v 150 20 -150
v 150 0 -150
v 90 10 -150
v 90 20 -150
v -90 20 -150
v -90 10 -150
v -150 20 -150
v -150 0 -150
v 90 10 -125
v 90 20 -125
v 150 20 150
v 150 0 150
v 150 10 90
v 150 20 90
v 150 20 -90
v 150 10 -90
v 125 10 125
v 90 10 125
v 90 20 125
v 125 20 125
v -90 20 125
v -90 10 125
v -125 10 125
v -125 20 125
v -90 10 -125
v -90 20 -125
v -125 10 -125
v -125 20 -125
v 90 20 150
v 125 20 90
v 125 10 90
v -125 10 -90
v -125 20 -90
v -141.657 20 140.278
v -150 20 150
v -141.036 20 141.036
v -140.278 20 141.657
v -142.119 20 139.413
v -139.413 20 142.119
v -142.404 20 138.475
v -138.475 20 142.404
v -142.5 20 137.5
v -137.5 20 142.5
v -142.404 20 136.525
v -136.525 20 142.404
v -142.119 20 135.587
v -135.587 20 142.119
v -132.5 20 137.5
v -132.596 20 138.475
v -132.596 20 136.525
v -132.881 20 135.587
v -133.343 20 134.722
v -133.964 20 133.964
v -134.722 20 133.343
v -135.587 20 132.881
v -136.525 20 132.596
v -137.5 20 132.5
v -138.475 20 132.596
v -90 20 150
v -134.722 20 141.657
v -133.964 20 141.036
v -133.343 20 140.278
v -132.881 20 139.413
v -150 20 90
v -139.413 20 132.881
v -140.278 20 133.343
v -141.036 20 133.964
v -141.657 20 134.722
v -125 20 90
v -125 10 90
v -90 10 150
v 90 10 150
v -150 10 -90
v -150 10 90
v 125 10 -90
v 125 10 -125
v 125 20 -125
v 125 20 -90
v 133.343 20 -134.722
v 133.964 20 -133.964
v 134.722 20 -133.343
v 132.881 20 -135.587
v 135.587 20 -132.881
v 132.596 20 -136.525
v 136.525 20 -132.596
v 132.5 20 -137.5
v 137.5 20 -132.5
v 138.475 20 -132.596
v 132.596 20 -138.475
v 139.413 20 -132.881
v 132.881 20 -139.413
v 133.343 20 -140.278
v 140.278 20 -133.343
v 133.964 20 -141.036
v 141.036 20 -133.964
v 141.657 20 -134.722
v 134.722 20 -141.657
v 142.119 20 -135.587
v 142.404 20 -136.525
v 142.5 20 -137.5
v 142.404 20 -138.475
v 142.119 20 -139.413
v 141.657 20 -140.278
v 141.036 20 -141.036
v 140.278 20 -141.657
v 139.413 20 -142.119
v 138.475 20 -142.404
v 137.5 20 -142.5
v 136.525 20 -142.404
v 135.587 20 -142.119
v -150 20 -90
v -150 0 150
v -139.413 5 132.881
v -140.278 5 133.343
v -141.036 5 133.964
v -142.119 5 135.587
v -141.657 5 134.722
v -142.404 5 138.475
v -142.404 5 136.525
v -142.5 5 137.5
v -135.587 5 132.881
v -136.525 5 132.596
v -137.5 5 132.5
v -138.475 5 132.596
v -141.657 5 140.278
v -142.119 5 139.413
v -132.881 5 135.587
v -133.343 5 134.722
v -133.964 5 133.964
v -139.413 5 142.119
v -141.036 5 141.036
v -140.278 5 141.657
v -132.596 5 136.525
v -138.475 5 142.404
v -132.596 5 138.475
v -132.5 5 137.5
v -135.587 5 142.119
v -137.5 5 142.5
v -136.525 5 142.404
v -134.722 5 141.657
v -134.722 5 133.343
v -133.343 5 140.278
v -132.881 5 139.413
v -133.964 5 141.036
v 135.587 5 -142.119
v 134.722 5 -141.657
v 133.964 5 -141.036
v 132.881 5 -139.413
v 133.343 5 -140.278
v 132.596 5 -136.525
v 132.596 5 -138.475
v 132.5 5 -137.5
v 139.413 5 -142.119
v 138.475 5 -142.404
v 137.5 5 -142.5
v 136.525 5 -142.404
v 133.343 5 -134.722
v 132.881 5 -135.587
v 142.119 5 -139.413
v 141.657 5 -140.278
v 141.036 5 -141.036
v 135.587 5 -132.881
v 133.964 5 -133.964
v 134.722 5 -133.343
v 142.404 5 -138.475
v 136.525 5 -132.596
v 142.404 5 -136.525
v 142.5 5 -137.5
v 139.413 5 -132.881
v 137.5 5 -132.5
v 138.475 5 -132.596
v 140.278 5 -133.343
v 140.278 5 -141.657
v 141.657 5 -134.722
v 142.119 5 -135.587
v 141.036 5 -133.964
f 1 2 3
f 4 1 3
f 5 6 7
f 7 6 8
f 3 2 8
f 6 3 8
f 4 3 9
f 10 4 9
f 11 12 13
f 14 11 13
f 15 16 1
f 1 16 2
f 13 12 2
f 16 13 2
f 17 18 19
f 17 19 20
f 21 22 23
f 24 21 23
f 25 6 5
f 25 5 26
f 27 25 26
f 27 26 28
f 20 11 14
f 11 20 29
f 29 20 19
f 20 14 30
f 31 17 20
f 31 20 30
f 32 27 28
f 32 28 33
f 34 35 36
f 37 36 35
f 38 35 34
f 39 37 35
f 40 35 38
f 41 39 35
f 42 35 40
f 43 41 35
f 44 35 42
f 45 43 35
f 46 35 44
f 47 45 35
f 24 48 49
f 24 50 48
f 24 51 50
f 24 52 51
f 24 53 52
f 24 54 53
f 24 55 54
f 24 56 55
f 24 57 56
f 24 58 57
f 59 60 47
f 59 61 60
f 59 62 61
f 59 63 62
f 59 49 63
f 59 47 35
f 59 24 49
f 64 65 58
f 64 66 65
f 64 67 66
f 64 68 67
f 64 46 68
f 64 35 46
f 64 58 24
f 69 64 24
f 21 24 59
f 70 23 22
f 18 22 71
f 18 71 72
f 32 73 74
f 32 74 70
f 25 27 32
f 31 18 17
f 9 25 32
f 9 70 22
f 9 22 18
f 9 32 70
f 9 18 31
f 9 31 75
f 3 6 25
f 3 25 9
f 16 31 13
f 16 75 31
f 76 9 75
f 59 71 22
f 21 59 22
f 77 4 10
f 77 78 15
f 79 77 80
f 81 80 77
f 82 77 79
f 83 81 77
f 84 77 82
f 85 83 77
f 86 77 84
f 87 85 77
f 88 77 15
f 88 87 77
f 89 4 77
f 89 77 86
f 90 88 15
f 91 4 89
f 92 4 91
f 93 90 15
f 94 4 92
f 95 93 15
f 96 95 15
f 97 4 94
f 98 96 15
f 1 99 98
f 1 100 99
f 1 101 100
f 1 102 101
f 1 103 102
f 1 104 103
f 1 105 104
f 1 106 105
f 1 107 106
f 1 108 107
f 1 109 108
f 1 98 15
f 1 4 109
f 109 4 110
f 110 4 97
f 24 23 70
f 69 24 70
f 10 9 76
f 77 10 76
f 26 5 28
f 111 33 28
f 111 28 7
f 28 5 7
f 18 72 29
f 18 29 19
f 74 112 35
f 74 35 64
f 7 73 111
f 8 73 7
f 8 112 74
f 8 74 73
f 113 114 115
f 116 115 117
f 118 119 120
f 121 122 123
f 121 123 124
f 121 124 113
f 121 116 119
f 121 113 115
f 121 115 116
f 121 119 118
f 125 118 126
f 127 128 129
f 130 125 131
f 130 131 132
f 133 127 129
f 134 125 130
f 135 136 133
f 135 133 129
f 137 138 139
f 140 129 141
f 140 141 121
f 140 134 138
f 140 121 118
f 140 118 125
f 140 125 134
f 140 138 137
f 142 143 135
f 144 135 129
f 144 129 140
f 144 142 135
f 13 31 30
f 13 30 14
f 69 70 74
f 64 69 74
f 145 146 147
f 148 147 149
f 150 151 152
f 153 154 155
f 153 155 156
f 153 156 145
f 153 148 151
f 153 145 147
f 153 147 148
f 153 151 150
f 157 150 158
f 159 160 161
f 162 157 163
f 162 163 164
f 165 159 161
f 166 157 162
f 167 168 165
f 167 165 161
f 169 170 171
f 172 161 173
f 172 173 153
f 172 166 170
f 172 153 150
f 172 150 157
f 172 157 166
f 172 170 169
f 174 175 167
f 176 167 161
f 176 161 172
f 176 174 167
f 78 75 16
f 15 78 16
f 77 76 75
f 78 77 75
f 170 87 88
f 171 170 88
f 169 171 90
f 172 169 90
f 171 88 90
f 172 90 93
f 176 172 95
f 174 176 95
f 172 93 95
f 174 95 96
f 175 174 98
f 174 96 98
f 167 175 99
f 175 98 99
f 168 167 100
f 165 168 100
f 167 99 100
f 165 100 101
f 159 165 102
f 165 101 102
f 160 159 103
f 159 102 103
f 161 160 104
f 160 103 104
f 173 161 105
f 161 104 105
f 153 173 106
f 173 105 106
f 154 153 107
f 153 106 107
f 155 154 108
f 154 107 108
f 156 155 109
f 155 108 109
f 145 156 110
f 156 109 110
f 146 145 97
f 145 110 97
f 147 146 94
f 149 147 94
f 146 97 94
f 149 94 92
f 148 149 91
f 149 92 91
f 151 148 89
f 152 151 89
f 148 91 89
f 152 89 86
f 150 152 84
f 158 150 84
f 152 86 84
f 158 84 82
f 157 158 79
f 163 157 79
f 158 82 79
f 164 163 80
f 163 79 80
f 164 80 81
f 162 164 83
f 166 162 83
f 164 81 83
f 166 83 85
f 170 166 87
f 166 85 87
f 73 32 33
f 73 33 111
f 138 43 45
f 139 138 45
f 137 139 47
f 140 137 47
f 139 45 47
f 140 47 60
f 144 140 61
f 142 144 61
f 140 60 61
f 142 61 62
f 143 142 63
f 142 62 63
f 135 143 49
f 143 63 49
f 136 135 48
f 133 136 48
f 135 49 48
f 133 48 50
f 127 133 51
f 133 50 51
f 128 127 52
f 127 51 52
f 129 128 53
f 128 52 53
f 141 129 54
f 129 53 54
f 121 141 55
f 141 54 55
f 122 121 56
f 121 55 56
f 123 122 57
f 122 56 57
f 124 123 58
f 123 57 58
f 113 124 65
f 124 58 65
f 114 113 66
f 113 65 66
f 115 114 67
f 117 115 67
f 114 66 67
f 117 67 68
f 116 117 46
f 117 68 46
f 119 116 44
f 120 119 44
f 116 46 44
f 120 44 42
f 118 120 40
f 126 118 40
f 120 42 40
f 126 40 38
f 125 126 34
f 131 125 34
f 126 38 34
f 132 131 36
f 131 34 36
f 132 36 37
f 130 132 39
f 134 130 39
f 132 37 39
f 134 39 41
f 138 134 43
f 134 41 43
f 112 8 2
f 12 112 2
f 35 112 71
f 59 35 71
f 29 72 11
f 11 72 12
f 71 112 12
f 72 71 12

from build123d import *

# Parameters (mm, degrees)
SKETCH1_W           = 300
SKETCH1_H           = 300
BOSS_EXTRUDE1_DEPTH = 10
BOSS_EXTRUDE2_DEPTH = 10
SKETCH3_R           = 5
CUT_EXTRUDE1_DEPTH  = 15


with BuildPart() as part:
    # Sketch1 → Boss-Extrude1 (new body)
    with BuildSketch(Plane(origin=(0, 0, 0), x_dir=(1, 0, 0), z_dir=(0, 1, 0))):
        Rectangle(SKETCH1_W, SKETCH1_H)
    extrude(amount=BOSS_EXTRUDE1_DEPTH)

    # Sketch2 → Boss-Extrude2 (add)
    with BuildSketch(Plane(origin=(0, 10, 0), x_dir=(1, 0, 0), z_dir=(0, 1, 0))):
        Polygon((150, 150), (90, 150), (90, 125), (125, 125), (125, 90), (150, 90), align=None)
        Polygon((-150, 90), (-150, 150), (-90, 150), (-90, 125), (-125, 125), (-125, 90), align=None)
        Polygon((-150, -150), (-90, -150), (-90, -125), (-125, -125), (-125, -90), (-150, -90), align=None)
        Polygon((150, -90), (150, -150), (90, -150), (90, -125), (125, -125), (125, -90), align=None)
    extrude(amount=BOSS_EXTRUDE2_DEPTH)

    # Sketch3 → Cut-Extrude1 (cut)
    with BuildSketch(Plane(origin=(0, 20, 0), x_dir=(1, 0, 0), z_dir=(0, 1, 0))):
        with Locations(Location((-137.5, -137.5, 0), (0, 0, 270))):
            Circle(SKETCH3_R)
        with Locations(Location((137.5, 137.5, 0), (0, 0, 270))):
            Circle(SKETCH3_R)
    extrude(amount=-CUT_EXTRUDE1_DEPTH, mode=Mode.SUBTRACT)


solid = part.part
